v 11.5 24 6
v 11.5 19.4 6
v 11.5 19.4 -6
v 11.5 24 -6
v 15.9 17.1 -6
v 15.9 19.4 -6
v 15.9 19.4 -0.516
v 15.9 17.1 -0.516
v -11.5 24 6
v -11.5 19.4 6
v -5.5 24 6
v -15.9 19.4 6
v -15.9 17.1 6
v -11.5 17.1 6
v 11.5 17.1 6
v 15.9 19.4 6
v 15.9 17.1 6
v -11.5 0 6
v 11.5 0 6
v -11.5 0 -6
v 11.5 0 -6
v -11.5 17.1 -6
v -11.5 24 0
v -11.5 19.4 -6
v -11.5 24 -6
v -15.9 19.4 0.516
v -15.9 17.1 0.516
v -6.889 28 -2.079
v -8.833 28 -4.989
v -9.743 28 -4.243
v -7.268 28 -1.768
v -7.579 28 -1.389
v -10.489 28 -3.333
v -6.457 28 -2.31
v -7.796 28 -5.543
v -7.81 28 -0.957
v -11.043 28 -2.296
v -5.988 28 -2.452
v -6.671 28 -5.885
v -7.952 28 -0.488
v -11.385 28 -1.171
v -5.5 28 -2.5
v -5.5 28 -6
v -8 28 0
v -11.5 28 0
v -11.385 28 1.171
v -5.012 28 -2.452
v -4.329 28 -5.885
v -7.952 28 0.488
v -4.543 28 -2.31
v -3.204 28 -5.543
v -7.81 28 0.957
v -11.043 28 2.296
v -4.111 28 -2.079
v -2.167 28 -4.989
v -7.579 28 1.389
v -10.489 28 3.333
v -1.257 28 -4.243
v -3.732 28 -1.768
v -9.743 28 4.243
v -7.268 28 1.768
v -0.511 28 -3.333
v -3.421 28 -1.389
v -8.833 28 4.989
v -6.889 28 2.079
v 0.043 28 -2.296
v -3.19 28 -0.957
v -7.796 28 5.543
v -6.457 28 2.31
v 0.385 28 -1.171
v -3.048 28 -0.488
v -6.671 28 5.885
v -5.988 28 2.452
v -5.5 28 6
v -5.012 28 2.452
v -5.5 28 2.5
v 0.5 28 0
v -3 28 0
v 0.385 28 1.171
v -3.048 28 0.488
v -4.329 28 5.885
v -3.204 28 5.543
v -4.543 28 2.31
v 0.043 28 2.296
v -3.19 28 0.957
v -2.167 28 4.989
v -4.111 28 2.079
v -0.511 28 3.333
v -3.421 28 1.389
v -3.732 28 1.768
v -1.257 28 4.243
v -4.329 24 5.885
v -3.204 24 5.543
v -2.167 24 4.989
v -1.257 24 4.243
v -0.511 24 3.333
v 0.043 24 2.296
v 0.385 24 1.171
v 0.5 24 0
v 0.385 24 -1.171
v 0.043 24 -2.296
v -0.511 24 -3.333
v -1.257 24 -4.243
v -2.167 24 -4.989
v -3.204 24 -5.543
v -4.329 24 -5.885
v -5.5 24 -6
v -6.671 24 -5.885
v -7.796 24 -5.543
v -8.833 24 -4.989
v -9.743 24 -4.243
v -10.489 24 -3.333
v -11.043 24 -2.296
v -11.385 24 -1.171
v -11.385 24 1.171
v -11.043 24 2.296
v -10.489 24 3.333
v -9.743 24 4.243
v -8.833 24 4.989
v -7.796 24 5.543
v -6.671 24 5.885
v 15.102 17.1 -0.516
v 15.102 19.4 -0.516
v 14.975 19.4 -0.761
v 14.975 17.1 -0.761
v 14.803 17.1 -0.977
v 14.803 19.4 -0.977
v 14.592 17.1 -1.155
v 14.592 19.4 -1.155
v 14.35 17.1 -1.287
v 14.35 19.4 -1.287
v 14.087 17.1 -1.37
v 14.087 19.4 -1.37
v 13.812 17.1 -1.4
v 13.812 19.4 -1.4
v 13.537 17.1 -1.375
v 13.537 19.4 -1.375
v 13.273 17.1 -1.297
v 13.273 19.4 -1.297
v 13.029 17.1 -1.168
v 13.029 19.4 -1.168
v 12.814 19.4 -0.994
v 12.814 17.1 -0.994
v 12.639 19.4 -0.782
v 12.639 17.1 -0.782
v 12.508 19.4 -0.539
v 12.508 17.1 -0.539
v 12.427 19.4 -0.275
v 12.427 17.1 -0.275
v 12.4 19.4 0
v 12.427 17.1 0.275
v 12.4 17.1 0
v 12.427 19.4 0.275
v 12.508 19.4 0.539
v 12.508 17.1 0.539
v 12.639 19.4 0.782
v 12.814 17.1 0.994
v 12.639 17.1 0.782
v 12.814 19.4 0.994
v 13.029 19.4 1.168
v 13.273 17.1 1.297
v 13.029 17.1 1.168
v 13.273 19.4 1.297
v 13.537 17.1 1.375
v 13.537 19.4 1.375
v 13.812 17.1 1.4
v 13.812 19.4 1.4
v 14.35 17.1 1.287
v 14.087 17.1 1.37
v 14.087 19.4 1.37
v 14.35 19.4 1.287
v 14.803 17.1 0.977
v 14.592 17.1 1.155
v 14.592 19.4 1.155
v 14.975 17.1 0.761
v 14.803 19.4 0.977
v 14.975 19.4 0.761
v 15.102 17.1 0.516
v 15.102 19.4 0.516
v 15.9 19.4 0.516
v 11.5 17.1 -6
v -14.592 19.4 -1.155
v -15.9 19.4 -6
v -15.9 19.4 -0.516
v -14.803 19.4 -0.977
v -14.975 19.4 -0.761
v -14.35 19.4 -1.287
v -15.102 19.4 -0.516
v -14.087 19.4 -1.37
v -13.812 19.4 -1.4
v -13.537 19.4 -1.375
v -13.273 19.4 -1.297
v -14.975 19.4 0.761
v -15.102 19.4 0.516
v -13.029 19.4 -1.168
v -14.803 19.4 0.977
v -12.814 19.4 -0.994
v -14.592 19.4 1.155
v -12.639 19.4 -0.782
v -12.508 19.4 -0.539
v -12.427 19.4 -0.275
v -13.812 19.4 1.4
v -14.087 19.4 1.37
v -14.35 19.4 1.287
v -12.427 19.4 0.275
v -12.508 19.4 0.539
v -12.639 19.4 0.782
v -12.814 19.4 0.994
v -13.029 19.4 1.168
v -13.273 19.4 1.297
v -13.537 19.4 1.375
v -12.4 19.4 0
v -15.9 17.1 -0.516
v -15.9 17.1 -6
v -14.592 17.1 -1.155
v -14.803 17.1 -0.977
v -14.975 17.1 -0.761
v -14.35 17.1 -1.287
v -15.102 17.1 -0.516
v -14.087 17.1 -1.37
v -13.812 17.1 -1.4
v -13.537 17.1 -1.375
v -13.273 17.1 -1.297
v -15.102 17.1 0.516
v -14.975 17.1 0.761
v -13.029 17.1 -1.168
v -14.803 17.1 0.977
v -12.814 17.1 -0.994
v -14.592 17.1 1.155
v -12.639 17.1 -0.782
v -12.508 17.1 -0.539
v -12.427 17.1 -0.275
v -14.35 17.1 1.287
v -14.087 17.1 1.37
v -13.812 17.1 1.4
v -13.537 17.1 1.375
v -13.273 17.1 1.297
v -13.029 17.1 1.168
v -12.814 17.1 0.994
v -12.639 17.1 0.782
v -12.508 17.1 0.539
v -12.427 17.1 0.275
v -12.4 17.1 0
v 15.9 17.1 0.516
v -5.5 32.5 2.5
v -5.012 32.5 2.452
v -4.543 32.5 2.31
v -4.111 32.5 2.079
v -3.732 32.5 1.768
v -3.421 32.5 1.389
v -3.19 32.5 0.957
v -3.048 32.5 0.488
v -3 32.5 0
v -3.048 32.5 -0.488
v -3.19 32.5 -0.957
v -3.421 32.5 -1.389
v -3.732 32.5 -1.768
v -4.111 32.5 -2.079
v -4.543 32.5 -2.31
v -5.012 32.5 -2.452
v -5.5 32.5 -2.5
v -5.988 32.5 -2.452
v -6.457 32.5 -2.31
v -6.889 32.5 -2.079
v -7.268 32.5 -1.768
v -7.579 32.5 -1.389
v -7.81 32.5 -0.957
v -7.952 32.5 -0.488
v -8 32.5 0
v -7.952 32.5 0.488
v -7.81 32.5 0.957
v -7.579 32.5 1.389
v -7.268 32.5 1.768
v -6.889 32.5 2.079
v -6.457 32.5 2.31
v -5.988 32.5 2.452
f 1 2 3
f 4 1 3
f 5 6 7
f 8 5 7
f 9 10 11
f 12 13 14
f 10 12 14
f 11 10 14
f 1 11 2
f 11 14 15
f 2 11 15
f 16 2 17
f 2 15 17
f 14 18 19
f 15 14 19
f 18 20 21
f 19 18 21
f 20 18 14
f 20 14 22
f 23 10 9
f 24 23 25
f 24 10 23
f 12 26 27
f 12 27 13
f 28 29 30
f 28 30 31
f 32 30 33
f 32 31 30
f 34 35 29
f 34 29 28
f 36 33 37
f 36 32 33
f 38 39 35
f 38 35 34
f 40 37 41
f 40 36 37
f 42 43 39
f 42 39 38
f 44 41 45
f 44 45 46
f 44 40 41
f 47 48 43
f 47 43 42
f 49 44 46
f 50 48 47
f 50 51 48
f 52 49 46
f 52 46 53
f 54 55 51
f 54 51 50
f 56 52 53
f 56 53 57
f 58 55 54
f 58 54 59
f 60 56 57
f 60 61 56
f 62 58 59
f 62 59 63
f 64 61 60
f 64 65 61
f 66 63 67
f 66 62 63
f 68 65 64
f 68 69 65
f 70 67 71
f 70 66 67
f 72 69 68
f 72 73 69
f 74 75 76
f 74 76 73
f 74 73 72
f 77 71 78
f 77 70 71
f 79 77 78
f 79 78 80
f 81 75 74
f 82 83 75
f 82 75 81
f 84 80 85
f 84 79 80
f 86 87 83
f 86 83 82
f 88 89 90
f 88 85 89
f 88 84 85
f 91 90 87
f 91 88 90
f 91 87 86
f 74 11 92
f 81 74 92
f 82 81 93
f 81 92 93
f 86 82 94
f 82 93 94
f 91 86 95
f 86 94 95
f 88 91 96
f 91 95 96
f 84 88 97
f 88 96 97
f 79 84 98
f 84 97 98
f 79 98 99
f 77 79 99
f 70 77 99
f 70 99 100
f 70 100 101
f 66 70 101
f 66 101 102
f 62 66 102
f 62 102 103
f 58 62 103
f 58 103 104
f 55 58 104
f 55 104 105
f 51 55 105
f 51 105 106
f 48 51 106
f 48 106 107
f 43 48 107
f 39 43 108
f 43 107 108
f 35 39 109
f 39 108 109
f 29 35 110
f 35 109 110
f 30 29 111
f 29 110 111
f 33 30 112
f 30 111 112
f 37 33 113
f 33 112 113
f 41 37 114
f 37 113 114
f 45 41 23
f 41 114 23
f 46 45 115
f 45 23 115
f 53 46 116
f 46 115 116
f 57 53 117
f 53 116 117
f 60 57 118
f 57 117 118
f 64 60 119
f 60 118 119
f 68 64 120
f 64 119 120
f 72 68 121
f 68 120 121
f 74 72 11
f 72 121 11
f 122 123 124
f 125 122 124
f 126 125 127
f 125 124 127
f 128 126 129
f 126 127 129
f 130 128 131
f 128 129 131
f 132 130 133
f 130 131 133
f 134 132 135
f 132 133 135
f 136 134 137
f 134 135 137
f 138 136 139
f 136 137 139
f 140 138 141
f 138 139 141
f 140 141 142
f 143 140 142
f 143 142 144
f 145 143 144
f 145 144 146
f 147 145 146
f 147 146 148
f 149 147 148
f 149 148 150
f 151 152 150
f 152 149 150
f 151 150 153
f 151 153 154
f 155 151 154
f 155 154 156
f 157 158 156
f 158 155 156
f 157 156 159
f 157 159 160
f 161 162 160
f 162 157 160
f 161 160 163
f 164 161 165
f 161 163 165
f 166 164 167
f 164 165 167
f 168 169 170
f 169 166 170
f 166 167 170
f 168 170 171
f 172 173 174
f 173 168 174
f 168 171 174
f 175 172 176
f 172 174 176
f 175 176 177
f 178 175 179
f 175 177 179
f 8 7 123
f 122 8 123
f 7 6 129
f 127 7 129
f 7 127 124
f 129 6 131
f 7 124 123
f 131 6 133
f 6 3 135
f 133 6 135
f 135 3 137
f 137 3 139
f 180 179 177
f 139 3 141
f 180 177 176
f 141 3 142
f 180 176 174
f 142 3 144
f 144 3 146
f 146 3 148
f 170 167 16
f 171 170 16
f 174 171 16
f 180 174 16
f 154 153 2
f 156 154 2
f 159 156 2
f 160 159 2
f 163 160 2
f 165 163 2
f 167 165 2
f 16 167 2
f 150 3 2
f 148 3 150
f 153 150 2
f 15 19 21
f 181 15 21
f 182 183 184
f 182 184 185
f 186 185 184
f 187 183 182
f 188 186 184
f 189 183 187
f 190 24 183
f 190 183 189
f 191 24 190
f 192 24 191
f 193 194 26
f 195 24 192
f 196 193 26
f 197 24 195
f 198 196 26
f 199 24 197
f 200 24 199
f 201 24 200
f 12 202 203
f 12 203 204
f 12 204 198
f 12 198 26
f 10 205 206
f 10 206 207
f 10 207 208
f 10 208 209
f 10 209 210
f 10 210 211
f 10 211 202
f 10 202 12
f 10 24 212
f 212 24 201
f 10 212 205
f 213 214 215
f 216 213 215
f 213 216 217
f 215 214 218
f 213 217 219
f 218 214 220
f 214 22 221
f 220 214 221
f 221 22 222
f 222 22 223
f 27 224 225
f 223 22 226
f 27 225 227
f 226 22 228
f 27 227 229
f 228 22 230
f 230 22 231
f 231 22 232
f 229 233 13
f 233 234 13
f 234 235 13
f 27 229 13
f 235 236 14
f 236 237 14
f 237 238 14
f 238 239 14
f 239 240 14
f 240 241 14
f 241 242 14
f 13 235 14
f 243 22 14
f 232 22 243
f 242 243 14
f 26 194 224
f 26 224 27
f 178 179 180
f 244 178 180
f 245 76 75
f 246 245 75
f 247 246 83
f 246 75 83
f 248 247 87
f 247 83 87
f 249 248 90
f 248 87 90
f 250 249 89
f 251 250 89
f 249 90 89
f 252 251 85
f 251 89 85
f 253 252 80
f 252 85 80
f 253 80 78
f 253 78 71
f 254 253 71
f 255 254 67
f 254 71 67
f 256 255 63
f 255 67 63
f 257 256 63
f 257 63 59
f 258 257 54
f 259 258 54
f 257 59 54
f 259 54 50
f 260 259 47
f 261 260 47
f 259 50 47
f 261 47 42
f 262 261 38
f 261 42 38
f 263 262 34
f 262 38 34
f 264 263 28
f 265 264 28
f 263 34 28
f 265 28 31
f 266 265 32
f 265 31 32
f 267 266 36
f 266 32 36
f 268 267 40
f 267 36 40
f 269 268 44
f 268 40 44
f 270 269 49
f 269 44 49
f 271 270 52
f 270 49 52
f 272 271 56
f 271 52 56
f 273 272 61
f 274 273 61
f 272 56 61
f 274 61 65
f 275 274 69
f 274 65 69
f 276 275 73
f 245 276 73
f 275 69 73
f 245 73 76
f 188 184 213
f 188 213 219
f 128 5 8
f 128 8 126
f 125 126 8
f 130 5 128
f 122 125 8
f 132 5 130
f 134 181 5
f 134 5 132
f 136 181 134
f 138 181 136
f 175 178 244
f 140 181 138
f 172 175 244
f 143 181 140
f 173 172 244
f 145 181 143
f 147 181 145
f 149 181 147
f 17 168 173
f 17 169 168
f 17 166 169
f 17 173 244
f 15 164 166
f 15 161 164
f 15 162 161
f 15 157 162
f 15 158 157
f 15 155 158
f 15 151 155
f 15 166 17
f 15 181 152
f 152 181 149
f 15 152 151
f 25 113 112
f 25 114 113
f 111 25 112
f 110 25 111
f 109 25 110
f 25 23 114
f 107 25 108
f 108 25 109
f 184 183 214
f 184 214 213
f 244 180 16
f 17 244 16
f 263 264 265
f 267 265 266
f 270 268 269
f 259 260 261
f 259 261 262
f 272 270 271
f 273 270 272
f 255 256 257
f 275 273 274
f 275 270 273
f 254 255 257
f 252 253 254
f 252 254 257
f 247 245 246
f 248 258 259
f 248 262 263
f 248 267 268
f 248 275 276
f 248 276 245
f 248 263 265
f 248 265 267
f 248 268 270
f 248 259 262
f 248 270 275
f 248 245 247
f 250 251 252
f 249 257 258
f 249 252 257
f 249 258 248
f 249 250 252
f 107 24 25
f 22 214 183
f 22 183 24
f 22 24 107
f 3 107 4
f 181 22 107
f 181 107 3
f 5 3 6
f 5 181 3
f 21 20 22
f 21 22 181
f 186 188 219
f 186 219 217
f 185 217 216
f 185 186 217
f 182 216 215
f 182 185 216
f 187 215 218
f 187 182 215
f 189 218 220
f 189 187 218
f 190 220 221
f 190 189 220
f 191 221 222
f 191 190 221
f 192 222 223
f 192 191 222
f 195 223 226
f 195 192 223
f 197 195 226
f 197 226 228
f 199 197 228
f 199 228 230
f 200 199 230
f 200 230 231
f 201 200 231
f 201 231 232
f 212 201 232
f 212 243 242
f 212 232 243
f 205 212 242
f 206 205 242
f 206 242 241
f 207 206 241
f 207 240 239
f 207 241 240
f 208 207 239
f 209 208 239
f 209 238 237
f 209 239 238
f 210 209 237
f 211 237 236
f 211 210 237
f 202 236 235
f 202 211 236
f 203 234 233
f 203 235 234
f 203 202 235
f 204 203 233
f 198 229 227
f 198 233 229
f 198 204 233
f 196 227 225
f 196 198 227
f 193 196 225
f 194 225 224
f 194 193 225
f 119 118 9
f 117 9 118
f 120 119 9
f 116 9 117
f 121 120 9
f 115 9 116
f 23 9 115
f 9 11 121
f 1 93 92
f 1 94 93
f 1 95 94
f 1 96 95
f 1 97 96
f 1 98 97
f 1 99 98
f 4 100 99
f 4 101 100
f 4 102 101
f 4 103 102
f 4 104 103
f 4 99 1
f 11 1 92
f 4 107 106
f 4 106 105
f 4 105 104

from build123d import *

# Parameters (mm, degrees)
CROQUIS1_W              = 23
CROQUIS1_H              = 12
SALIENTE_EXTRUIR1_DEPTH = 24
CROQUIS2_W              = 12
CROQUIS2_H              = 2.3
SALIENTE_EXTRUIR2_DEPTH = 4.4
CORTAR_EXTRUIR1_REACH   = 27.791
CROQUIS4_R              = 6
SALIENTE_EXTRUIR4_DEPTH = 4
CROQUIS5_R              = 2.5
SALIENTE_EXTRUIR5_DEPTH = 4.5


with BuildPart() as part:
    # Croquis1 → Saliente-Extruir1 (new body)
    with BuildSketch(Plane(origin=(0, 0, 0), x_dir=(1, 0, 0), z_dir=(0, 1, 0))):
        Rectangle(CROQUIS1_W, CROQUIS1_H)
    extrude(amount=SALIENTE_EXTRUIR1_DEPTH)

    # Croquis2 → Saliente-Extruir2 (add)
    with BuildSketch(Plane.ZY.offset(11.5)):
        with Locations((0, 18.25)):
            Rectangle(CROQUIS2_W, CROQUIS2_H)
    saliente_extruir2 = extrude(amount=SALIENTE_EXTRUIR2_DEPTH)

    # Croquis3 → Cortar-Extruir1 (cut, up to next)
    with BuildSketch(Plane(origin=(0, 19.4, 0), x_dir=(1, 0, 0), z_dir=(0, 1, 0)), mode=Mode.PRIVATE) as cortar_extruir1_sk1:
        with BuildLine():
            Line((-15.101550129, -0.515720139), (-15.9, -0.515720139))
            Line((-15.9, -0.515720139), (-15.9, 0.515720139))
            Line((-15.9, 0.515720139), (-15.101550129, 0.515720139))
            ThreePointArc((-15.101550129, 0.515720139), (-12.4, 0), (-15.101550129, -0.515720139))
        make_face()
    cortar_extruir1_tool1 = extrude(cortar_extruir1_sk1.sketch, amount=-CORTAR_EXTRUIR1_REACH, mode=Mode.PRIVATE) & part.part
    cortar_extruir1 = cortar_extruir1_tool1.solids().sort_by_distance((-13.989391, 19.4, 0))[0]
    add(cortar_extruir1, mode=Mode.SUBTRACT)

    # Simetría1: Saliente-Extruir2, Cortar-Extruir1 across plane
    add(saliente_extruir2.mirror(Plane(origin=(0, 0, 0), x_dir=(0, 0, 1), z_dir=(1, 0, 0))))
    add(cortar_extruir1.mirror(Plane(origin=(0, 0, 0), x_dir=(0, 0, 1), z_dir=(1, 0, 0))), mode=Mode.SUBTRACT)

    # Croquis4 → Saliente-Extruir4 (add)
    with BuildSketch(Plane(origin=(0, 24, 0), x_dir=(1, 0, 0), z_dir=(0, 1, 0))):
        with Locations(Location((-5.5, 0, 0), (0, 0, 270))):
            Circle(CROQUIS4_R)
    extrude(amount=SALIENTE_EXTRUIR4_DEPTH)

    # Croquis5 → Saliente-Extruir5 (add)
    with BuildSketch(Plane(origin=(0, 28, 0), x_dir=(1, 0, 0), z_dir=(0, 1, 0))):
        with Locations(Location((-5.5, 0, 0), (0, 0, 270))):
            Circle(CROQUIS5_R)
    extrude(amount=SALIENTE_EXTRUIR5_DEPTH)


solid = part.part
